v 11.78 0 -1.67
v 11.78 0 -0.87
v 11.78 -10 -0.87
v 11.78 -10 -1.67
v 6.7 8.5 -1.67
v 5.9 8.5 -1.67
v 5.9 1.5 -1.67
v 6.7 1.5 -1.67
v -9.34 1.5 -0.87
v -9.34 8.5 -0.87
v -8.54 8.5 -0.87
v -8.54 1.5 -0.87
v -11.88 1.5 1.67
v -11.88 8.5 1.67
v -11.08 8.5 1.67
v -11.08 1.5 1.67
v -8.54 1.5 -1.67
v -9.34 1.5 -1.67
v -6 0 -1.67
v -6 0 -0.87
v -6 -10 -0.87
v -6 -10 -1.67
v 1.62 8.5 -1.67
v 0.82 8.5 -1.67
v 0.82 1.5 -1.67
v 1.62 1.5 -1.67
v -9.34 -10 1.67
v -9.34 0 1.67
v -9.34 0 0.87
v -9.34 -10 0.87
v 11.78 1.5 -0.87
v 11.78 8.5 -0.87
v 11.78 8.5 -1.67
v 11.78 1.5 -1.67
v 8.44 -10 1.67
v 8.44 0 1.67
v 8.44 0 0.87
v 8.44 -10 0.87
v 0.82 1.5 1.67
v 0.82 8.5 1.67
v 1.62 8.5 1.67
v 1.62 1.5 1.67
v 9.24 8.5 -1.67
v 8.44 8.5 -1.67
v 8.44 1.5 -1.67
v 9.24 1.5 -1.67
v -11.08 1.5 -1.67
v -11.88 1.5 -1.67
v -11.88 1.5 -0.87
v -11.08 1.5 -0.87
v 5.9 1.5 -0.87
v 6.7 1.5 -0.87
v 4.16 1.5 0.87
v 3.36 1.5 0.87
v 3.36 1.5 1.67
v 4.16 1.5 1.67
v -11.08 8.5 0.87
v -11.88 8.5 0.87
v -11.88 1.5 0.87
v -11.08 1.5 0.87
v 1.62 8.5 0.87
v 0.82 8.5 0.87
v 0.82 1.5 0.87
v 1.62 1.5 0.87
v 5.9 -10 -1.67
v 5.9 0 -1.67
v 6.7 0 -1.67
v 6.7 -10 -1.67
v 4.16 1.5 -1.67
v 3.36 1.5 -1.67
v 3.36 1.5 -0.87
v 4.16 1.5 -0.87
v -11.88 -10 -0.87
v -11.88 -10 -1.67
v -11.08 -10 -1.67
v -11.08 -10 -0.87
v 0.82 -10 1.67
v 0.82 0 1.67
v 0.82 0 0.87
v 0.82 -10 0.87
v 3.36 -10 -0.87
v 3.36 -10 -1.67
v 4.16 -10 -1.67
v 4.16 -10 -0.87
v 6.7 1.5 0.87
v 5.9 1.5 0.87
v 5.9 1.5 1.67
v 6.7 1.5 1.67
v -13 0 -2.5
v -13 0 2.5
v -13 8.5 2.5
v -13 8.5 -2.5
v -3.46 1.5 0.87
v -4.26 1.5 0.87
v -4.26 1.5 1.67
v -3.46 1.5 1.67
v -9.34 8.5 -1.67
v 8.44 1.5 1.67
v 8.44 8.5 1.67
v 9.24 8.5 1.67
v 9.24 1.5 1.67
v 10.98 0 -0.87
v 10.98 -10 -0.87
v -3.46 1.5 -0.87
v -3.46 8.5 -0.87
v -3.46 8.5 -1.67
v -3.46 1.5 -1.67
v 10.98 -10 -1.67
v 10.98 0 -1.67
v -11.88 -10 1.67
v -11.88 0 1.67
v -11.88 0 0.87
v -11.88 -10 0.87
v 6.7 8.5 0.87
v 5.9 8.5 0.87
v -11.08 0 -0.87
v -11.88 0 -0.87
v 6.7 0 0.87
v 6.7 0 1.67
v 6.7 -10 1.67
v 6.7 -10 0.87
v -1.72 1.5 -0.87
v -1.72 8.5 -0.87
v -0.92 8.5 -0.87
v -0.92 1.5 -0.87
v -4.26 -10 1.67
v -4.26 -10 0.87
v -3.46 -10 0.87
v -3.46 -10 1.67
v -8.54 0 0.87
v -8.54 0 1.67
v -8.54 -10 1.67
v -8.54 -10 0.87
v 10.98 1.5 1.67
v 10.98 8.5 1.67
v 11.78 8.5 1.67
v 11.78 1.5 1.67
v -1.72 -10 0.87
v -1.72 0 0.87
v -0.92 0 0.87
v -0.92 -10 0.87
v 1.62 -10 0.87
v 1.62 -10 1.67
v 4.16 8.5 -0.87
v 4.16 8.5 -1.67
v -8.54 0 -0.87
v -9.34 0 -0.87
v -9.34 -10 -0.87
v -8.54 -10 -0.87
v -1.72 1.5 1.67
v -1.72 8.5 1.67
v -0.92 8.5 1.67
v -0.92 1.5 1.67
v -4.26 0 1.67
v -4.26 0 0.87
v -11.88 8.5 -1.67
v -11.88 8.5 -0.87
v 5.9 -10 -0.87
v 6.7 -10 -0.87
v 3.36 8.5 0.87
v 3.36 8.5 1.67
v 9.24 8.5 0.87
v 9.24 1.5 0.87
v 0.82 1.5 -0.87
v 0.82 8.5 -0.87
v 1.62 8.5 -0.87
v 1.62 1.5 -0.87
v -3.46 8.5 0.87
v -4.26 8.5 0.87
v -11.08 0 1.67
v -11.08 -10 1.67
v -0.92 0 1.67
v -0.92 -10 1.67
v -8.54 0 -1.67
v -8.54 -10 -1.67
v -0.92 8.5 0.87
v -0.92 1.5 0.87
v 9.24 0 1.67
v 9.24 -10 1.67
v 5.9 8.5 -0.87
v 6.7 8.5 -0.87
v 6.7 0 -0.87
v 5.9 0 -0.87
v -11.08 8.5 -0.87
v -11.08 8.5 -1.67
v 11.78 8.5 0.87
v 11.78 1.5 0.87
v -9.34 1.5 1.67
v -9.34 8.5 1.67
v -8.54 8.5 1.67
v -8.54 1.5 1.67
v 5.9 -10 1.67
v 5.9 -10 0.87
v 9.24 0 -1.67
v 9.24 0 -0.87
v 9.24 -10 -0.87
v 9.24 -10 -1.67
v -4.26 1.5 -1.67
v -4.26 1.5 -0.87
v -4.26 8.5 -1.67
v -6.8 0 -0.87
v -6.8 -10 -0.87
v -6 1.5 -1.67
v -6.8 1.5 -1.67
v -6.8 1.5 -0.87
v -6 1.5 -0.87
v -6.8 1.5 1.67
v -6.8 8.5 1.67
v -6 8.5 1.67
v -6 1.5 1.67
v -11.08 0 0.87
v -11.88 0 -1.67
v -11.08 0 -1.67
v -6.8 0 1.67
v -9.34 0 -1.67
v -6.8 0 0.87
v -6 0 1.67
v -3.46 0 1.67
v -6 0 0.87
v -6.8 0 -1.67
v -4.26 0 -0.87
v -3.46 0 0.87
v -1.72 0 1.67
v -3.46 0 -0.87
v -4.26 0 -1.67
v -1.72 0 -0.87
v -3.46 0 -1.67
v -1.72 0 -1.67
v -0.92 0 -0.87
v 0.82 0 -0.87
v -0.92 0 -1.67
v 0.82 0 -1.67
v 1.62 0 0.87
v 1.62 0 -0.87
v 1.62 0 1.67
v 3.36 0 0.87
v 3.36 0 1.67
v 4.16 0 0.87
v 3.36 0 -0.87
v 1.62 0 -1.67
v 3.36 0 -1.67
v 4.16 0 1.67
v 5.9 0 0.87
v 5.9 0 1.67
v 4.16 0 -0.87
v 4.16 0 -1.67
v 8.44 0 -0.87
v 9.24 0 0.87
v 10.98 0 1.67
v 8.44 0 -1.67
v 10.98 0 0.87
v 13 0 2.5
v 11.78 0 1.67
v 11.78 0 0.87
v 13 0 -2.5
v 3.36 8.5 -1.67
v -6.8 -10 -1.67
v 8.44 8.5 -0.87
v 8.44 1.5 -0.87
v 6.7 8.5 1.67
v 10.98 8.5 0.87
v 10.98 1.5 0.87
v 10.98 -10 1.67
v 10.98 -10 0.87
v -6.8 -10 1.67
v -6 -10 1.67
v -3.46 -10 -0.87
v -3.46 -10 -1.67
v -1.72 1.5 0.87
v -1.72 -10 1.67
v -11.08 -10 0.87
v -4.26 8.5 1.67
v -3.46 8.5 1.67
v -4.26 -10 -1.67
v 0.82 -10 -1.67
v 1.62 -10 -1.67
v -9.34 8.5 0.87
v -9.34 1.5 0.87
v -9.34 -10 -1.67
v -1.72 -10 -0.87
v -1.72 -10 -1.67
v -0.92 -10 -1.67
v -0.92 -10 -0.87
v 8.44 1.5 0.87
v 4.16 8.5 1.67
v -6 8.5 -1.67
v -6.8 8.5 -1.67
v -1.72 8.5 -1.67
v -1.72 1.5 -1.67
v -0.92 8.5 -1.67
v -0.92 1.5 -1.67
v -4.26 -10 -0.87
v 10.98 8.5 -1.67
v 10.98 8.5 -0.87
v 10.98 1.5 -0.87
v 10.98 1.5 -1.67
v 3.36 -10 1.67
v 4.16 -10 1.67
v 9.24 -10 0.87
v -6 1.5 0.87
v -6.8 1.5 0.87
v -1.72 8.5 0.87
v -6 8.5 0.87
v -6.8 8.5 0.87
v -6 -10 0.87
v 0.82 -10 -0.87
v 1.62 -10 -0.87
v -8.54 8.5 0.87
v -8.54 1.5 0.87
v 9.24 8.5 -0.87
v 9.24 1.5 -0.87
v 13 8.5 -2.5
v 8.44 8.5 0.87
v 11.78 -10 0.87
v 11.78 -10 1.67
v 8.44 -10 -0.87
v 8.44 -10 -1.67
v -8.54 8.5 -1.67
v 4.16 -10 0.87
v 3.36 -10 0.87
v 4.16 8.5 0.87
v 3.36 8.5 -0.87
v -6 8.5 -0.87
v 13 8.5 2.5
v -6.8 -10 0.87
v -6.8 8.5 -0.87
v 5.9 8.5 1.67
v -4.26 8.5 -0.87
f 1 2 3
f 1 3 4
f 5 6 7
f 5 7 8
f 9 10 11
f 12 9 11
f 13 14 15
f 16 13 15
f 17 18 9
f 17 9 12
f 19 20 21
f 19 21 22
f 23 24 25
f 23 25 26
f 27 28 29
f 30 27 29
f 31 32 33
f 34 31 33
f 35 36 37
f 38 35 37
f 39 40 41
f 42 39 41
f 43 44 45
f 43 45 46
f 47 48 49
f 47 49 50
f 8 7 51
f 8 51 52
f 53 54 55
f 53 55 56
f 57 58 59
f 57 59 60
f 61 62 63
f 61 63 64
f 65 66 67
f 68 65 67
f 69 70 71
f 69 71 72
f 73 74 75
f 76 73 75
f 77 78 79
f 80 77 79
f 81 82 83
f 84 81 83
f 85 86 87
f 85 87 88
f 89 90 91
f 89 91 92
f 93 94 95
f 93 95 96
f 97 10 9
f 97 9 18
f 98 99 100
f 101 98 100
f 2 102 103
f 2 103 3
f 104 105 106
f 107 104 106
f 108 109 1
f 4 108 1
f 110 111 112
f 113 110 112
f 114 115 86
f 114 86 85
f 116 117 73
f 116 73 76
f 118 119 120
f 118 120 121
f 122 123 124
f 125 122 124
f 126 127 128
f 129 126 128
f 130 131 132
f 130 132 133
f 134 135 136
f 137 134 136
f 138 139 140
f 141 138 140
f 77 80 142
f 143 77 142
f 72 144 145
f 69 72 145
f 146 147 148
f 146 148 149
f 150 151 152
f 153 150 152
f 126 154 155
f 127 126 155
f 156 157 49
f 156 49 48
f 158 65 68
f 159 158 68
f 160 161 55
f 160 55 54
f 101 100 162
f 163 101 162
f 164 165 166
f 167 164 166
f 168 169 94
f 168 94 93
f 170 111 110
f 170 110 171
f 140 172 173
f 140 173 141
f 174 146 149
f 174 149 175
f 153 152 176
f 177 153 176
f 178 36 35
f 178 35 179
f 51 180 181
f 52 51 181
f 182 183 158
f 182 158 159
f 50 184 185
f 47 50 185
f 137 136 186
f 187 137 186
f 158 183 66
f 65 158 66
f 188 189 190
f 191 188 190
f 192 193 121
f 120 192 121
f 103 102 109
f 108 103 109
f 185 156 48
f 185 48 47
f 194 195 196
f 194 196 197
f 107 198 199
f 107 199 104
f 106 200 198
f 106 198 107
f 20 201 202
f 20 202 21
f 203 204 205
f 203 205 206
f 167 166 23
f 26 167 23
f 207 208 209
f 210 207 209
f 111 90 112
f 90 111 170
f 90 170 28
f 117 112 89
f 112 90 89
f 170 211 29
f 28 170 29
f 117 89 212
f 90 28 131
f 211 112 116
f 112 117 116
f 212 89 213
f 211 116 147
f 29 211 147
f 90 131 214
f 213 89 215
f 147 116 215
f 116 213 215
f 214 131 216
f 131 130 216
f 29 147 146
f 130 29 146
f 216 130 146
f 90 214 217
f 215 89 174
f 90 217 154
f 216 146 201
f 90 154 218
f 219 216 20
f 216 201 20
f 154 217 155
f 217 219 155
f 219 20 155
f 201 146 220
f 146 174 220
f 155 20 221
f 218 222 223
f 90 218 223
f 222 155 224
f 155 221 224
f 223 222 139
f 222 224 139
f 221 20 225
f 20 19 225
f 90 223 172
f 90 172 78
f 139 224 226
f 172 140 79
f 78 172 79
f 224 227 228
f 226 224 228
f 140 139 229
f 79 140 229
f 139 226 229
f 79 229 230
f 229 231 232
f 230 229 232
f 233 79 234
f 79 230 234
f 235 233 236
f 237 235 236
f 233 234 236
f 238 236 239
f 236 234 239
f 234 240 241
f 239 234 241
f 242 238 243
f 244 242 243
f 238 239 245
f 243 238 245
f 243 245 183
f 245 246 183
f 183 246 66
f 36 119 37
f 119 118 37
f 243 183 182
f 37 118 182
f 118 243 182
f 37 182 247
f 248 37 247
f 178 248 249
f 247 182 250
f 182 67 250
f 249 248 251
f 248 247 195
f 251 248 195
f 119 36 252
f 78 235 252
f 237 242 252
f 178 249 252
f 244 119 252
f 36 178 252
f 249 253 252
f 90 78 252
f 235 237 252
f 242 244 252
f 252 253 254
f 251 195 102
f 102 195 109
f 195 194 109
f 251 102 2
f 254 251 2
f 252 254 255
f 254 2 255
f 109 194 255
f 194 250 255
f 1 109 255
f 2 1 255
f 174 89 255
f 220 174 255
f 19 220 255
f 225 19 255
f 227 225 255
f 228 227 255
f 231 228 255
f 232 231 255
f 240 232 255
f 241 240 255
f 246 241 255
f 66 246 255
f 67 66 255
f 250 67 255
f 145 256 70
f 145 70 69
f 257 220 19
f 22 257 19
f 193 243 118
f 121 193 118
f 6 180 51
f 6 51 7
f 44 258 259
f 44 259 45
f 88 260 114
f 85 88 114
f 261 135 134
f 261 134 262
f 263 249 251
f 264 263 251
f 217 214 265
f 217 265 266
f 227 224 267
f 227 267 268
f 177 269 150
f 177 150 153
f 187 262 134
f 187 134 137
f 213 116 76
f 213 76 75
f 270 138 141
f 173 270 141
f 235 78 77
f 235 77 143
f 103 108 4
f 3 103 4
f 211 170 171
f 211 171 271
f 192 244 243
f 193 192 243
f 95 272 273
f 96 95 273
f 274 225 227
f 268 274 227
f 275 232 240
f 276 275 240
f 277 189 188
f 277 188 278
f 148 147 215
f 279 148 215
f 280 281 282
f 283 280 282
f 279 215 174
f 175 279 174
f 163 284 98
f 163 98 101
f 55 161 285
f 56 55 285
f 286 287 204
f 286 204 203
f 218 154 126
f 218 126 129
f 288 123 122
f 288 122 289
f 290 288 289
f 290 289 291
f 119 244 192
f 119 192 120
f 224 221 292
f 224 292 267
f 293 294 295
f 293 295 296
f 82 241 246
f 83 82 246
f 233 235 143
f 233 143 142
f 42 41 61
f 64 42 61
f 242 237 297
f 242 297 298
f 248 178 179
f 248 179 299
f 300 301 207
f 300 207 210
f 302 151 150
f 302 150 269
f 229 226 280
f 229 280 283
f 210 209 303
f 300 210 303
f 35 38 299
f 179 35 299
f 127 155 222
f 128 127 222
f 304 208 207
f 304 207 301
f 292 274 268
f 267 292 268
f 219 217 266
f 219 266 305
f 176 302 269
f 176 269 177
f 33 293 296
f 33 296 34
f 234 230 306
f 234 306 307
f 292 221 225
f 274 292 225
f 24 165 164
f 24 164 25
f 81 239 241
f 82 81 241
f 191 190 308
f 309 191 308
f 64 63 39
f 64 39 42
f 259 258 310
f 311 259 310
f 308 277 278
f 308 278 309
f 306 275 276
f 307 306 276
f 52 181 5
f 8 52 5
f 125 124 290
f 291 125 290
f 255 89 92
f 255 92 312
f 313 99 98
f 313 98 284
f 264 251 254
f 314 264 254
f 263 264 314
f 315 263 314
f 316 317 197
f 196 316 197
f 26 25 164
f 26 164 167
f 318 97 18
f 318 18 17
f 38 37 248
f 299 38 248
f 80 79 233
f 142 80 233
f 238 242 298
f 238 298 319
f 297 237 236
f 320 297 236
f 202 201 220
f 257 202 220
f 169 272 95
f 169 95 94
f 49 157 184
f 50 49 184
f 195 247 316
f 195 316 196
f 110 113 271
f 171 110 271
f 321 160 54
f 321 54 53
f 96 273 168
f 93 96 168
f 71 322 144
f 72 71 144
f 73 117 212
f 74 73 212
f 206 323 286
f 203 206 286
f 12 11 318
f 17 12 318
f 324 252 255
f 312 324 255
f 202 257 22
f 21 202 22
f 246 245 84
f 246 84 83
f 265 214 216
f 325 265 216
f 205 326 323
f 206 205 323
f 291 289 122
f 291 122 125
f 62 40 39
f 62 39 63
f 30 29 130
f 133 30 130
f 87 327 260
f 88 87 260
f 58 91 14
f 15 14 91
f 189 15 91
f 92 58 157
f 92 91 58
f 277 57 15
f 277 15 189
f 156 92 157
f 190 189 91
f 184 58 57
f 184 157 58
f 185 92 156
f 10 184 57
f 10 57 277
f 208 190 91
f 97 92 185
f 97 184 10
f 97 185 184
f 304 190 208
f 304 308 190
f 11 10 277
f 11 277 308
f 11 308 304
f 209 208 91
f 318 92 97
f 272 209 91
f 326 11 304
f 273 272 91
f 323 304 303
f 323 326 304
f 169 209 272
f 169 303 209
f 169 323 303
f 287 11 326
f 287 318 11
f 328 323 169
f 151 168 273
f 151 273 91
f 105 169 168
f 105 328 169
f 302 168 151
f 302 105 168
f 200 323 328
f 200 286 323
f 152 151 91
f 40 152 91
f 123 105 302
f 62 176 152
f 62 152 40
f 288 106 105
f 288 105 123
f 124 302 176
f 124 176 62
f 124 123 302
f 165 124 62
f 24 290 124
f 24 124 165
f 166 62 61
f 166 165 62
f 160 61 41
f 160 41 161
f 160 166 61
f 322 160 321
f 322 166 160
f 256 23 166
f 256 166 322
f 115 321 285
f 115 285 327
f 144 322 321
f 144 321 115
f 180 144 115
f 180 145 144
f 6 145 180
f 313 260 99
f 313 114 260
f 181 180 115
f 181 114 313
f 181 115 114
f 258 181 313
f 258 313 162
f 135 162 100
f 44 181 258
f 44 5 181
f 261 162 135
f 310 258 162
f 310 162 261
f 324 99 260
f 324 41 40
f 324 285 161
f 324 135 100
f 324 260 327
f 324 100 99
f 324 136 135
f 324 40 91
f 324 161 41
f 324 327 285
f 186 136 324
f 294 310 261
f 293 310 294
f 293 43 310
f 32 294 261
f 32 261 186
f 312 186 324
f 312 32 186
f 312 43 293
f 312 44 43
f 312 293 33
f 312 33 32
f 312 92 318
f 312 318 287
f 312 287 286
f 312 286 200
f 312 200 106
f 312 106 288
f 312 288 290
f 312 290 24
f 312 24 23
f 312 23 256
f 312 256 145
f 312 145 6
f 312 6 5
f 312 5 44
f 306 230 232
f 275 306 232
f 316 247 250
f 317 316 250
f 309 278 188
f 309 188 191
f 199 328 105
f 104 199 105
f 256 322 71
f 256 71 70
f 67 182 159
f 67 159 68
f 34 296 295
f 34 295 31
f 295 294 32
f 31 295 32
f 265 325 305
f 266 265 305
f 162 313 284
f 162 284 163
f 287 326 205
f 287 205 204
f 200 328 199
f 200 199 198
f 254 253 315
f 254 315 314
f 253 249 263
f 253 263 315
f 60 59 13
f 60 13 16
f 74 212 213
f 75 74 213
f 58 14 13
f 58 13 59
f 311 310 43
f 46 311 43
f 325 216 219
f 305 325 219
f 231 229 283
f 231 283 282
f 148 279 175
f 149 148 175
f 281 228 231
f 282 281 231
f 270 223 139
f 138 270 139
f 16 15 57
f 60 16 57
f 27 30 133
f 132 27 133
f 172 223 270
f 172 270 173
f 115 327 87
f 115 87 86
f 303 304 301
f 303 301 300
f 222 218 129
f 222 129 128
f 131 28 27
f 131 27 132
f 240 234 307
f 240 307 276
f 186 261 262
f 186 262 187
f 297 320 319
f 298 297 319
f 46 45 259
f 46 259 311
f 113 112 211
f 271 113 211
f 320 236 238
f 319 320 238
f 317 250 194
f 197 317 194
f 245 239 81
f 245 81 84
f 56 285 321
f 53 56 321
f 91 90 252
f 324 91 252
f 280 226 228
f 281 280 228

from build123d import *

# Parameters (mm, degrees)
SKIZZE1_W                       = 26
SKIZZE1_H                       = 5
AUFSATZ_LINEAR_AUSTRAGEN1_DEPTH = 8.5
SKIZZE2_W                       = 0.8
SKIZZE2_H                       = 0.8
AUFSATZ_LINEAR_AUSTRAGEN2_DEPTH = 10
SKIZZE3_W                       = 0.8
SKIZZE3_H                       = 0.8
SCHNITT_LINEAR_AUSTRAGEN1_DEPTH = 7
LINEARES_MUSTER1_COUNT          = 10
LINEARES_MUSTER1_PITCH          = 2.54
LINEARES_MUSTER1_COUNT_DIR2     = 2
LINEARES_MUSTER1_PITCH_DIR2     = 2.54


with BuildPart() as part:
    # Skizze1 → Aufsatz-Linear austragen1 (new body)
    with BuildSketch(Plane(origin=(0, 0, 0), x_dir=(1, 0, 0), z_dir=(0, 1, 0))):
        Rectangle(SKIZZE1_W, SKIZZE1_H)
    extrude(amount=AUFSATZ_LINEAR_AUSTRAGEN1_DEPTH)

    # Skizze2 → Aufsatz-Linear austragen2 (add)
    with BuildSketch(Plane(origin=(0, 0, 0), x_dir=(1, 0, 0), z_dir=(0, 1, 0))):
        with Locations((-11.48, -1.27)):
            Rectangle(SKIZZE2_W, SKIZZE2_H)
    aufsatz_linear_austragen2 = extrude(amount=-AUFSATZ_LINEAR_AUSTRAGEN2_DEPTH)

    # Skizze3 → Schnitt-Linear austragen1 (cut)
    with BuildSketch(Plane(origin=(0, 8.5, 0), x_dir=(1, 0, 0), z_dir=(0, 1, 0))):
        with Locations((-11.48, -1.27)):
            Rectangle(SKIZZE3_W, SKIZZE3_H)
    schnitt_linear_austragen1 = extrude(amount=-SCHNITT_LINEAR_AUSTRAGEN1_DEPTH, mode=Mode.SUBTRACT)

    # Lineares Muster1: Aufsatz-Linear austragen2, Schnitt-Linear austragen1 10 × 2
    with Locations(*[(i * LINEARES_MUSTER1_PITCH, 0, -j * LINEARES_MUSTER1_PITCH_DIR2) for i in range(LINEARES_MUSTER1_COUNT) for j in range(LINEARES_MUSTER1_COUNT_DIR2) if (i, j) != (0, 0)]):
        add(aufsatz_linear_austragen2)
        add(schnitt_linear_austragen1, mode=Mode.SUBTRACT)


solid = part.part
